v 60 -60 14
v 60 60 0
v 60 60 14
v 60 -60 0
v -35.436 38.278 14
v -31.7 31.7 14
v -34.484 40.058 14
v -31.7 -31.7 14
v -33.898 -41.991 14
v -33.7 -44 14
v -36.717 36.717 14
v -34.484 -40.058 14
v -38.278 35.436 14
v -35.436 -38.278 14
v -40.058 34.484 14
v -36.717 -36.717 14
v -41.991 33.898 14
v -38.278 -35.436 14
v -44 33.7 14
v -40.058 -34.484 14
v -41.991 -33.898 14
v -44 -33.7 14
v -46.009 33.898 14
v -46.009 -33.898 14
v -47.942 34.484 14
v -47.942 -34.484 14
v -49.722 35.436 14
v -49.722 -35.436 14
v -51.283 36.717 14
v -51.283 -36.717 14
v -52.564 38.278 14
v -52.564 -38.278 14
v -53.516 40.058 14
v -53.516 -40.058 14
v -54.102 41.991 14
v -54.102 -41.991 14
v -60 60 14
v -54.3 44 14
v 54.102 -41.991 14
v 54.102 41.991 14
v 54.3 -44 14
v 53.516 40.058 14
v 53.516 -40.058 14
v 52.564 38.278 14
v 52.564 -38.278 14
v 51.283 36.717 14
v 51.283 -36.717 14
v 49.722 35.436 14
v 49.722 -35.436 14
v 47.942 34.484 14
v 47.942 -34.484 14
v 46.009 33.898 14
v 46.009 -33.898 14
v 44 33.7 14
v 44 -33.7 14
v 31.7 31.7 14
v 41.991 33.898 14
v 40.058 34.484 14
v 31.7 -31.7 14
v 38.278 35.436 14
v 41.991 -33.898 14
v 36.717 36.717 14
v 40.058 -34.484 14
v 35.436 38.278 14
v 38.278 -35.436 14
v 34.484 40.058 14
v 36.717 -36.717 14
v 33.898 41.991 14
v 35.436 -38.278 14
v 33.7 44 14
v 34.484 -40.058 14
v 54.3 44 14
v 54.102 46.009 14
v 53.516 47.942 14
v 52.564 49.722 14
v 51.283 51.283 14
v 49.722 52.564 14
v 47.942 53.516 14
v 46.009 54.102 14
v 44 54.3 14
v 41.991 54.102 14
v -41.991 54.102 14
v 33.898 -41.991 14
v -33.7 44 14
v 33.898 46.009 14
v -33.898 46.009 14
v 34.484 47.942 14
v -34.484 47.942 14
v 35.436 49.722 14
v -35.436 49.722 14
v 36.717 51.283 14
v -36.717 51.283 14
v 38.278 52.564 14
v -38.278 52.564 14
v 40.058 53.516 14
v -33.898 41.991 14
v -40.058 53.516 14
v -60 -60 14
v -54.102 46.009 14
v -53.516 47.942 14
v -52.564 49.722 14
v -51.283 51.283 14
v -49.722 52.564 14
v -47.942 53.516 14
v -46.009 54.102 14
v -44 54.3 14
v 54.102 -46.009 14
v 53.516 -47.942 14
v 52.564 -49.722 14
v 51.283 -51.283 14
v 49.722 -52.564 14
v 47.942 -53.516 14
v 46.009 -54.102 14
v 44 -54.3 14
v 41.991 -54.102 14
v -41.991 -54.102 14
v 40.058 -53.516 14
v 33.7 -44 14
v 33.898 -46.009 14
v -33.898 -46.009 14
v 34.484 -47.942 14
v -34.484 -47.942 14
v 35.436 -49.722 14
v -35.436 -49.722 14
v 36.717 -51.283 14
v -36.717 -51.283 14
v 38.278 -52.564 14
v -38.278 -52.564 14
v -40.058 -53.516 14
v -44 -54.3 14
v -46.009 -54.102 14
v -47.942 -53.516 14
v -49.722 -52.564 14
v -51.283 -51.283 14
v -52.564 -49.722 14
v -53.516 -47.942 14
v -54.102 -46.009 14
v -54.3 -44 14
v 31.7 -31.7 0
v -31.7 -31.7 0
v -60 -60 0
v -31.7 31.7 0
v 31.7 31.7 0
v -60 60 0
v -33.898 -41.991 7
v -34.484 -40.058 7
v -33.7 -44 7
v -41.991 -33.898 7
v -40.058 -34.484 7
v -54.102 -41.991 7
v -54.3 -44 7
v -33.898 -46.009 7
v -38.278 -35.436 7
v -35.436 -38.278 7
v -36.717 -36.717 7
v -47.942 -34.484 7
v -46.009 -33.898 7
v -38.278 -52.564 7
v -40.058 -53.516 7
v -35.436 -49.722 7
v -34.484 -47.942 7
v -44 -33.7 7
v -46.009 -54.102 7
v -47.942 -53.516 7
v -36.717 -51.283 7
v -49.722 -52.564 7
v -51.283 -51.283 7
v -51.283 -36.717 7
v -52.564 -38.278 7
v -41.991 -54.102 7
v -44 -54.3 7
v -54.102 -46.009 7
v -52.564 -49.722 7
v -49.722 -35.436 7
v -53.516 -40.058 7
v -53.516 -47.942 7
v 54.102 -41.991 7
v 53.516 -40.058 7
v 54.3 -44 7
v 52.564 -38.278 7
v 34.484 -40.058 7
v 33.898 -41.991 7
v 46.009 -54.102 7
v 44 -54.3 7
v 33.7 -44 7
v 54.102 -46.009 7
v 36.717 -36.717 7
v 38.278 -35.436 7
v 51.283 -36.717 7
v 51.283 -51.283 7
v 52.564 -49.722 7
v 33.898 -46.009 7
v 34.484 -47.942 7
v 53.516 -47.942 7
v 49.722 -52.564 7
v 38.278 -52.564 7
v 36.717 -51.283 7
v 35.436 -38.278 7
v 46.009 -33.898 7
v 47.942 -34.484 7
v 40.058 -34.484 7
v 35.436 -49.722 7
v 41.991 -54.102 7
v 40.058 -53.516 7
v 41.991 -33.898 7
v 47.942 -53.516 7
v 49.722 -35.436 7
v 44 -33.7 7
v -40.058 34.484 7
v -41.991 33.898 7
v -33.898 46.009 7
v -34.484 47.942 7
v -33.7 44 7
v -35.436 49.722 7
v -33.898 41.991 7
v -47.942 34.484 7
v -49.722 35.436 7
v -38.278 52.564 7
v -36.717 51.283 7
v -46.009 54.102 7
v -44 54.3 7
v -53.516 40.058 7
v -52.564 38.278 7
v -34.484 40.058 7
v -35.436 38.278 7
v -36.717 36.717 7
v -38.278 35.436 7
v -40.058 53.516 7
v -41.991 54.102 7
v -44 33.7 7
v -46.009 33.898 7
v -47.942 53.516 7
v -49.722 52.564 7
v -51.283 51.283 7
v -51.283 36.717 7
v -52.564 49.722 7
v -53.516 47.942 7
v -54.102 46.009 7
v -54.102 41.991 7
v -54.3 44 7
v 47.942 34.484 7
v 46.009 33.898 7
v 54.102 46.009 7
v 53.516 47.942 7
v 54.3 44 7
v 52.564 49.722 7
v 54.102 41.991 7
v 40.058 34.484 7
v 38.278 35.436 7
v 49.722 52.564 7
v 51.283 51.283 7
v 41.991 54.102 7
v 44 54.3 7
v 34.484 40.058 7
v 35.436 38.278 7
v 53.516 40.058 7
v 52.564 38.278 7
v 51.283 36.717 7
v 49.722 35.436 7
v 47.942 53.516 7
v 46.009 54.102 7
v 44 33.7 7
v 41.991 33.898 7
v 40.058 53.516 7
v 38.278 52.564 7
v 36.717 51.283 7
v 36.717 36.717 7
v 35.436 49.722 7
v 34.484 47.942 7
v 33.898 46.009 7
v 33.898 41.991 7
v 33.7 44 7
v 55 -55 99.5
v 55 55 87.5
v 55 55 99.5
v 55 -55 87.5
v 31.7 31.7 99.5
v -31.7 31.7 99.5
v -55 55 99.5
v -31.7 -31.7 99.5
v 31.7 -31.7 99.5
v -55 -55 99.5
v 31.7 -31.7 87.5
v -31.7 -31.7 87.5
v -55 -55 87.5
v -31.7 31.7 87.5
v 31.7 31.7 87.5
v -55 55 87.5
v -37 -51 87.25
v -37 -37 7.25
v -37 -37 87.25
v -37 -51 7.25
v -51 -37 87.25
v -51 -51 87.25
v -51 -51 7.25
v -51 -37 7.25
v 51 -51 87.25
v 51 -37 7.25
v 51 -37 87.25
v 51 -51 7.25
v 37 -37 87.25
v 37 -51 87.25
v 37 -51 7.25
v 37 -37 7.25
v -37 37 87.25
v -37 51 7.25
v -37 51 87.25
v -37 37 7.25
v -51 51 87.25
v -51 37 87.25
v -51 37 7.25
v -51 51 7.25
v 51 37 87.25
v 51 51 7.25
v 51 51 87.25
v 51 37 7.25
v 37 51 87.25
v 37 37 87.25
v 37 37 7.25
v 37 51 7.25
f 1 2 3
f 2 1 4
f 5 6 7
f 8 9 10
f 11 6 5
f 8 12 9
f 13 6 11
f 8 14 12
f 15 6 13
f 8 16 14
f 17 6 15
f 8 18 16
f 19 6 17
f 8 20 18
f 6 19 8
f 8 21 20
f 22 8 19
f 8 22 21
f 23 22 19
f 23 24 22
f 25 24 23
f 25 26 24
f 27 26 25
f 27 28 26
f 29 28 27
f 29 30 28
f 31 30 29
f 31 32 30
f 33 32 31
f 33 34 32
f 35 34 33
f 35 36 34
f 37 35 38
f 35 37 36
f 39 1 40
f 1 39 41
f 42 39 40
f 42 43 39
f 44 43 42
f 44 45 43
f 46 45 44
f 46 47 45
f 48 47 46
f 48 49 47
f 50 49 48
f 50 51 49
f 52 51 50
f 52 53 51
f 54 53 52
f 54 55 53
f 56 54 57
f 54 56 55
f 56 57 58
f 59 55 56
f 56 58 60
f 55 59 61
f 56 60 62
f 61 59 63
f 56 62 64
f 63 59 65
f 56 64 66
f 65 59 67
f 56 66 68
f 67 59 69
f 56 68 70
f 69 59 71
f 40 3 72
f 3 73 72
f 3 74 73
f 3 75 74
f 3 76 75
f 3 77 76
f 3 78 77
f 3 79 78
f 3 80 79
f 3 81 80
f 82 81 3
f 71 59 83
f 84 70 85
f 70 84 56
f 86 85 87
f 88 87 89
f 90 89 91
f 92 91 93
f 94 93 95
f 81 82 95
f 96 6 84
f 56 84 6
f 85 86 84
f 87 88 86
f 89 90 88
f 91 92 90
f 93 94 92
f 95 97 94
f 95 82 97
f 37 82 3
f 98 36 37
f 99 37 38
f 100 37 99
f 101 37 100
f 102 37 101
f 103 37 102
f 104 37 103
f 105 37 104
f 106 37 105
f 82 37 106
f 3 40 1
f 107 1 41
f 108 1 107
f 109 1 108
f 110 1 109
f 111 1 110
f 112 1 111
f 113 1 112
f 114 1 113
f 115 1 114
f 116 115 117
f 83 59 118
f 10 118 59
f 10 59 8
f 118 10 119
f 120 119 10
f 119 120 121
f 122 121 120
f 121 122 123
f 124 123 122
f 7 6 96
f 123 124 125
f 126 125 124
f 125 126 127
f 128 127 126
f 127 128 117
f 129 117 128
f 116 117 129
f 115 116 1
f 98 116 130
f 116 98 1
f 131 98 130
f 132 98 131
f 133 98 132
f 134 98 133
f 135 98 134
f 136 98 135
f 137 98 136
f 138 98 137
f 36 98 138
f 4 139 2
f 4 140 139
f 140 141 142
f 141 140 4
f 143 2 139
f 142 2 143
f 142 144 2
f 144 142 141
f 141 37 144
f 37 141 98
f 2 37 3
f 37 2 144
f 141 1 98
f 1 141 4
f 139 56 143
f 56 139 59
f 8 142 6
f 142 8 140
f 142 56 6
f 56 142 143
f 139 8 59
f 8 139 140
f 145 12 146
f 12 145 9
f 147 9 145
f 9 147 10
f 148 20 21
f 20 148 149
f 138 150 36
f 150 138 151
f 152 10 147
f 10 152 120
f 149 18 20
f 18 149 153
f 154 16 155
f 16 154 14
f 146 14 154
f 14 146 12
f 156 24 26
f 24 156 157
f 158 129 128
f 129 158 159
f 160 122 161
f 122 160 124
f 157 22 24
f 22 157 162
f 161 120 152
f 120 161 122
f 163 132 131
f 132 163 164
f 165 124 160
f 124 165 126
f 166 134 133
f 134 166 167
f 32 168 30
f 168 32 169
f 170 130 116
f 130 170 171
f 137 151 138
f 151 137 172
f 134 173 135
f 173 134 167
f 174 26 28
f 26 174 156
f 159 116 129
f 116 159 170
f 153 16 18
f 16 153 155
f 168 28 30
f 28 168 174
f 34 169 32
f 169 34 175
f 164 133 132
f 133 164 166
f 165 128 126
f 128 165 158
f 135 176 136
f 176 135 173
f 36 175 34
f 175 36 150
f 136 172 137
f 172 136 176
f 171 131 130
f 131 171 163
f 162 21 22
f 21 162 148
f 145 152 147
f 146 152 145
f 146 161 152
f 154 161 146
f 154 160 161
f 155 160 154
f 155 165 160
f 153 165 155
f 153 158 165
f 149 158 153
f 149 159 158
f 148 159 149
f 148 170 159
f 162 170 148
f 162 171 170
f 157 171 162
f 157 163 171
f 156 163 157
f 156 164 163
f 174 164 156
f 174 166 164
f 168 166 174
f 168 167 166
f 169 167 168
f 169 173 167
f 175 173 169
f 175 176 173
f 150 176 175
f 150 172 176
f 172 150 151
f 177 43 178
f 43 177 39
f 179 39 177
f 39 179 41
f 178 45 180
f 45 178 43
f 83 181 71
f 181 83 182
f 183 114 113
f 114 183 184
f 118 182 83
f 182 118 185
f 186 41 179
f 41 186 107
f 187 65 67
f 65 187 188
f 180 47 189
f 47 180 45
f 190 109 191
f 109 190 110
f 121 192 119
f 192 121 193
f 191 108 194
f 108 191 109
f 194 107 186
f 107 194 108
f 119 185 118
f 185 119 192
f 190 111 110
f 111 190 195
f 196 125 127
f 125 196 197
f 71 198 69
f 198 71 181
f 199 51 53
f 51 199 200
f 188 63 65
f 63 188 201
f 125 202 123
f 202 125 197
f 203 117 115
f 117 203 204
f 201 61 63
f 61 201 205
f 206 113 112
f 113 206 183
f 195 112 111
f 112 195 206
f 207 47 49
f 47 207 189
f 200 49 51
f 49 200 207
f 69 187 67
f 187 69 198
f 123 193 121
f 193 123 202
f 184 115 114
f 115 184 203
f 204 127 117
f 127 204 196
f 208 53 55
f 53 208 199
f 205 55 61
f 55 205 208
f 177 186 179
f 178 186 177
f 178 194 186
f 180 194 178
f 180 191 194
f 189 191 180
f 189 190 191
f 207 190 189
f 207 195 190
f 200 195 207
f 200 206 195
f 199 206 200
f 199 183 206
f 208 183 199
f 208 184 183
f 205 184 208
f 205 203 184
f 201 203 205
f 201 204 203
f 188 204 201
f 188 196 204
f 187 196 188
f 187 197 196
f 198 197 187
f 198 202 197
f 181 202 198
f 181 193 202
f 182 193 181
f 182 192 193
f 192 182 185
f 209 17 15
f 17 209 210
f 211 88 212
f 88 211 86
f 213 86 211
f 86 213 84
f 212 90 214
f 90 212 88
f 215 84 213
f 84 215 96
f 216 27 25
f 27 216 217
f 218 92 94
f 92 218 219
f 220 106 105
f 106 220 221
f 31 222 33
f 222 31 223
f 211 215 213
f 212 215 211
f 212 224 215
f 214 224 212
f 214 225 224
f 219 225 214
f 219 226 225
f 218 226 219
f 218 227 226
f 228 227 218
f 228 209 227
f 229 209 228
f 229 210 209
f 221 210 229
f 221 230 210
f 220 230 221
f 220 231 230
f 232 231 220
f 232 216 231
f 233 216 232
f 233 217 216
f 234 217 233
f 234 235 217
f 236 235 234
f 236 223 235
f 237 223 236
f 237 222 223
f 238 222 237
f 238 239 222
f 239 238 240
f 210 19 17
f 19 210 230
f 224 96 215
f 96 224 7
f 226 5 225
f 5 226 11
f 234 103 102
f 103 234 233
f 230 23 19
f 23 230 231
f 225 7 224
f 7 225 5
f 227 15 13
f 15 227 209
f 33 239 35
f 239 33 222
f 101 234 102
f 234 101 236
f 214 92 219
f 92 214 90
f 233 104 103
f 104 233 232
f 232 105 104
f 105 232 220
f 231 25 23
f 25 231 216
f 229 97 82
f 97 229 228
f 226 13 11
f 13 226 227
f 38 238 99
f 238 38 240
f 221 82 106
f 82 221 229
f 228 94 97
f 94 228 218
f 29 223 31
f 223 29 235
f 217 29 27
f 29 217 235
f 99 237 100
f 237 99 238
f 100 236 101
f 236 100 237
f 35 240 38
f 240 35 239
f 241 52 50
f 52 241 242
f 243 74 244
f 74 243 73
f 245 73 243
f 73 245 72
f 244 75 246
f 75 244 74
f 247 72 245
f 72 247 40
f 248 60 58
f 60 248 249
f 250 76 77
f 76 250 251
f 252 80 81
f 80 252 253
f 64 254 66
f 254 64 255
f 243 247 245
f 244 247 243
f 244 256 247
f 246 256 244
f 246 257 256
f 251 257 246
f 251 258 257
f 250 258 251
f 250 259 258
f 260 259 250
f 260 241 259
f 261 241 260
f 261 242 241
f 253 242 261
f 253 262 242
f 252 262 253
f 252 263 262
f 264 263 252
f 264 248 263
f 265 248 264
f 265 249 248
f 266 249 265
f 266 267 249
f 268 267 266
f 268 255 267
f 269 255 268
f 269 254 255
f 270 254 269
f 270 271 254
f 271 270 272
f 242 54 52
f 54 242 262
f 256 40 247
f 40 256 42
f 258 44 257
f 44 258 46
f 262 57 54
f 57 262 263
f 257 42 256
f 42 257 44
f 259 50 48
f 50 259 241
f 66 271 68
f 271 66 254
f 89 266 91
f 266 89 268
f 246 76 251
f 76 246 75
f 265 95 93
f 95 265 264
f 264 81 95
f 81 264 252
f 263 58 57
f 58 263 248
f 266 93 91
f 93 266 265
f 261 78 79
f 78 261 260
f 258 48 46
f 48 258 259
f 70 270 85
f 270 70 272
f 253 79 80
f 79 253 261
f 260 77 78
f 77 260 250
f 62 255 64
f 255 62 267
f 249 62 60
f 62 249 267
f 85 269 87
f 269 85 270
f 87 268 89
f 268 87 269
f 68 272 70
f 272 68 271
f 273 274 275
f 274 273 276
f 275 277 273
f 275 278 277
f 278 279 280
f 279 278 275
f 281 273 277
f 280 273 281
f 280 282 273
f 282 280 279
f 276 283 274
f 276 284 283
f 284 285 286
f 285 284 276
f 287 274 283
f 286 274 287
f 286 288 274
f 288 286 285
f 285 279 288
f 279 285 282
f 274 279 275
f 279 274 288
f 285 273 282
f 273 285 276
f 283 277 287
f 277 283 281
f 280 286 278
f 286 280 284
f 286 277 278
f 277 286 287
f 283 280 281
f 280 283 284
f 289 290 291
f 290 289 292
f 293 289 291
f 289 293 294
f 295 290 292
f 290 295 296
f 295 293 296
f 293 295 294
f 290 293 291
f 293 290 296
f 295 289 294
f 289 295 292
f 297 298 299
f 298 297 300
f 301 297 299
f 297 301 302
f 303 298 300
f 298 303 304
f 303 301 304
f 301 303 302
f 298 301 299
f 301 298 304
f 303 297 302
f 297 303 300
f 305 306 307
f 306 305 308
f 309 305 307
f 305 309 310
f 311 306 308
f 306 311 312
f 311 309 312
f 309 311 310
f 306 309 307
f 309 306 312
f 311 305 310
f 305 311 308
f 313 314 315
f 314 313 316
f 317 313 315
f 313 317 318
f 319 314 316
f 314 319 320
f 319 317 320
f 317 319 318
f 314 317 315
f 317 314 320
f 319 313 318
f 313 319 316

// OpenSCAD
$fn = 32;

// ------------------------------------------------------------------------
// Frame cube: base 120 x 120 mm, posts 80 mm tall
// Every part is its own module, assembly() places every instance.
// ------------------------------------------------------------------------

// --- part 1 ---
module base_frame() {
  difference() {
    translate([-60, -60, 0]) cube([120, 120, 14]);
    translate([-31.7, -31.7, -1]) cube([63.4, 63.4, 16]);
    translate([-44, -44, 7]) cylinder(h = 8, d = 20.6);
    translate([44, -44, 7]) cylinder(h = 8, d = 20.6);
    translate([-44, 44, 7]) cylinder(h = 8, d = 20.6);
    translate([44, 44, 7]) cylinder(h = 8, d = 20.6);
  }
}

// --- part 2 ---
module corner_post() {
  translate([-7, -7, 0]) cube([14, 14, 80]);
}

// --- part 3 ---
module top_frame() {
  difference() {
    translate([-55, -55, 0]) cube([110, 110, 12]);
    translate([-31.7, -31.7, -1]) cube([63.4, 63.4, 14]);
  }
}

// --- assembly ---
module assembly() {
  color([0.80, 0.24, 0.20]) translate([0, 0, 0]) rotate([0, 0, 0]) base_frame();
  color([0.20, 0.45, 0.75]) translate([-44, -44, 7.25]) rotate([0, 0, 0]) corner_post();
  color([0.25, 0.62, 0.32]) translate([44, -44, 7.25]) rotate([0, 0, 0]) corner_post();
  color([0.92, 0.70, 0.18]) translate([-44, 44, 7.25]) rotate([0, 0, 0]) corner_post();
  color([0.58, 0.35, 0.70]) translate([44, 44, 7.25]) rotate([0, 0, 0]) corner_post();
  color([0.16, 0.66, 0.66]) translate([0, 0, 87.5]) rotate([0, 0, 0]) top_frame();
}

assembly();
